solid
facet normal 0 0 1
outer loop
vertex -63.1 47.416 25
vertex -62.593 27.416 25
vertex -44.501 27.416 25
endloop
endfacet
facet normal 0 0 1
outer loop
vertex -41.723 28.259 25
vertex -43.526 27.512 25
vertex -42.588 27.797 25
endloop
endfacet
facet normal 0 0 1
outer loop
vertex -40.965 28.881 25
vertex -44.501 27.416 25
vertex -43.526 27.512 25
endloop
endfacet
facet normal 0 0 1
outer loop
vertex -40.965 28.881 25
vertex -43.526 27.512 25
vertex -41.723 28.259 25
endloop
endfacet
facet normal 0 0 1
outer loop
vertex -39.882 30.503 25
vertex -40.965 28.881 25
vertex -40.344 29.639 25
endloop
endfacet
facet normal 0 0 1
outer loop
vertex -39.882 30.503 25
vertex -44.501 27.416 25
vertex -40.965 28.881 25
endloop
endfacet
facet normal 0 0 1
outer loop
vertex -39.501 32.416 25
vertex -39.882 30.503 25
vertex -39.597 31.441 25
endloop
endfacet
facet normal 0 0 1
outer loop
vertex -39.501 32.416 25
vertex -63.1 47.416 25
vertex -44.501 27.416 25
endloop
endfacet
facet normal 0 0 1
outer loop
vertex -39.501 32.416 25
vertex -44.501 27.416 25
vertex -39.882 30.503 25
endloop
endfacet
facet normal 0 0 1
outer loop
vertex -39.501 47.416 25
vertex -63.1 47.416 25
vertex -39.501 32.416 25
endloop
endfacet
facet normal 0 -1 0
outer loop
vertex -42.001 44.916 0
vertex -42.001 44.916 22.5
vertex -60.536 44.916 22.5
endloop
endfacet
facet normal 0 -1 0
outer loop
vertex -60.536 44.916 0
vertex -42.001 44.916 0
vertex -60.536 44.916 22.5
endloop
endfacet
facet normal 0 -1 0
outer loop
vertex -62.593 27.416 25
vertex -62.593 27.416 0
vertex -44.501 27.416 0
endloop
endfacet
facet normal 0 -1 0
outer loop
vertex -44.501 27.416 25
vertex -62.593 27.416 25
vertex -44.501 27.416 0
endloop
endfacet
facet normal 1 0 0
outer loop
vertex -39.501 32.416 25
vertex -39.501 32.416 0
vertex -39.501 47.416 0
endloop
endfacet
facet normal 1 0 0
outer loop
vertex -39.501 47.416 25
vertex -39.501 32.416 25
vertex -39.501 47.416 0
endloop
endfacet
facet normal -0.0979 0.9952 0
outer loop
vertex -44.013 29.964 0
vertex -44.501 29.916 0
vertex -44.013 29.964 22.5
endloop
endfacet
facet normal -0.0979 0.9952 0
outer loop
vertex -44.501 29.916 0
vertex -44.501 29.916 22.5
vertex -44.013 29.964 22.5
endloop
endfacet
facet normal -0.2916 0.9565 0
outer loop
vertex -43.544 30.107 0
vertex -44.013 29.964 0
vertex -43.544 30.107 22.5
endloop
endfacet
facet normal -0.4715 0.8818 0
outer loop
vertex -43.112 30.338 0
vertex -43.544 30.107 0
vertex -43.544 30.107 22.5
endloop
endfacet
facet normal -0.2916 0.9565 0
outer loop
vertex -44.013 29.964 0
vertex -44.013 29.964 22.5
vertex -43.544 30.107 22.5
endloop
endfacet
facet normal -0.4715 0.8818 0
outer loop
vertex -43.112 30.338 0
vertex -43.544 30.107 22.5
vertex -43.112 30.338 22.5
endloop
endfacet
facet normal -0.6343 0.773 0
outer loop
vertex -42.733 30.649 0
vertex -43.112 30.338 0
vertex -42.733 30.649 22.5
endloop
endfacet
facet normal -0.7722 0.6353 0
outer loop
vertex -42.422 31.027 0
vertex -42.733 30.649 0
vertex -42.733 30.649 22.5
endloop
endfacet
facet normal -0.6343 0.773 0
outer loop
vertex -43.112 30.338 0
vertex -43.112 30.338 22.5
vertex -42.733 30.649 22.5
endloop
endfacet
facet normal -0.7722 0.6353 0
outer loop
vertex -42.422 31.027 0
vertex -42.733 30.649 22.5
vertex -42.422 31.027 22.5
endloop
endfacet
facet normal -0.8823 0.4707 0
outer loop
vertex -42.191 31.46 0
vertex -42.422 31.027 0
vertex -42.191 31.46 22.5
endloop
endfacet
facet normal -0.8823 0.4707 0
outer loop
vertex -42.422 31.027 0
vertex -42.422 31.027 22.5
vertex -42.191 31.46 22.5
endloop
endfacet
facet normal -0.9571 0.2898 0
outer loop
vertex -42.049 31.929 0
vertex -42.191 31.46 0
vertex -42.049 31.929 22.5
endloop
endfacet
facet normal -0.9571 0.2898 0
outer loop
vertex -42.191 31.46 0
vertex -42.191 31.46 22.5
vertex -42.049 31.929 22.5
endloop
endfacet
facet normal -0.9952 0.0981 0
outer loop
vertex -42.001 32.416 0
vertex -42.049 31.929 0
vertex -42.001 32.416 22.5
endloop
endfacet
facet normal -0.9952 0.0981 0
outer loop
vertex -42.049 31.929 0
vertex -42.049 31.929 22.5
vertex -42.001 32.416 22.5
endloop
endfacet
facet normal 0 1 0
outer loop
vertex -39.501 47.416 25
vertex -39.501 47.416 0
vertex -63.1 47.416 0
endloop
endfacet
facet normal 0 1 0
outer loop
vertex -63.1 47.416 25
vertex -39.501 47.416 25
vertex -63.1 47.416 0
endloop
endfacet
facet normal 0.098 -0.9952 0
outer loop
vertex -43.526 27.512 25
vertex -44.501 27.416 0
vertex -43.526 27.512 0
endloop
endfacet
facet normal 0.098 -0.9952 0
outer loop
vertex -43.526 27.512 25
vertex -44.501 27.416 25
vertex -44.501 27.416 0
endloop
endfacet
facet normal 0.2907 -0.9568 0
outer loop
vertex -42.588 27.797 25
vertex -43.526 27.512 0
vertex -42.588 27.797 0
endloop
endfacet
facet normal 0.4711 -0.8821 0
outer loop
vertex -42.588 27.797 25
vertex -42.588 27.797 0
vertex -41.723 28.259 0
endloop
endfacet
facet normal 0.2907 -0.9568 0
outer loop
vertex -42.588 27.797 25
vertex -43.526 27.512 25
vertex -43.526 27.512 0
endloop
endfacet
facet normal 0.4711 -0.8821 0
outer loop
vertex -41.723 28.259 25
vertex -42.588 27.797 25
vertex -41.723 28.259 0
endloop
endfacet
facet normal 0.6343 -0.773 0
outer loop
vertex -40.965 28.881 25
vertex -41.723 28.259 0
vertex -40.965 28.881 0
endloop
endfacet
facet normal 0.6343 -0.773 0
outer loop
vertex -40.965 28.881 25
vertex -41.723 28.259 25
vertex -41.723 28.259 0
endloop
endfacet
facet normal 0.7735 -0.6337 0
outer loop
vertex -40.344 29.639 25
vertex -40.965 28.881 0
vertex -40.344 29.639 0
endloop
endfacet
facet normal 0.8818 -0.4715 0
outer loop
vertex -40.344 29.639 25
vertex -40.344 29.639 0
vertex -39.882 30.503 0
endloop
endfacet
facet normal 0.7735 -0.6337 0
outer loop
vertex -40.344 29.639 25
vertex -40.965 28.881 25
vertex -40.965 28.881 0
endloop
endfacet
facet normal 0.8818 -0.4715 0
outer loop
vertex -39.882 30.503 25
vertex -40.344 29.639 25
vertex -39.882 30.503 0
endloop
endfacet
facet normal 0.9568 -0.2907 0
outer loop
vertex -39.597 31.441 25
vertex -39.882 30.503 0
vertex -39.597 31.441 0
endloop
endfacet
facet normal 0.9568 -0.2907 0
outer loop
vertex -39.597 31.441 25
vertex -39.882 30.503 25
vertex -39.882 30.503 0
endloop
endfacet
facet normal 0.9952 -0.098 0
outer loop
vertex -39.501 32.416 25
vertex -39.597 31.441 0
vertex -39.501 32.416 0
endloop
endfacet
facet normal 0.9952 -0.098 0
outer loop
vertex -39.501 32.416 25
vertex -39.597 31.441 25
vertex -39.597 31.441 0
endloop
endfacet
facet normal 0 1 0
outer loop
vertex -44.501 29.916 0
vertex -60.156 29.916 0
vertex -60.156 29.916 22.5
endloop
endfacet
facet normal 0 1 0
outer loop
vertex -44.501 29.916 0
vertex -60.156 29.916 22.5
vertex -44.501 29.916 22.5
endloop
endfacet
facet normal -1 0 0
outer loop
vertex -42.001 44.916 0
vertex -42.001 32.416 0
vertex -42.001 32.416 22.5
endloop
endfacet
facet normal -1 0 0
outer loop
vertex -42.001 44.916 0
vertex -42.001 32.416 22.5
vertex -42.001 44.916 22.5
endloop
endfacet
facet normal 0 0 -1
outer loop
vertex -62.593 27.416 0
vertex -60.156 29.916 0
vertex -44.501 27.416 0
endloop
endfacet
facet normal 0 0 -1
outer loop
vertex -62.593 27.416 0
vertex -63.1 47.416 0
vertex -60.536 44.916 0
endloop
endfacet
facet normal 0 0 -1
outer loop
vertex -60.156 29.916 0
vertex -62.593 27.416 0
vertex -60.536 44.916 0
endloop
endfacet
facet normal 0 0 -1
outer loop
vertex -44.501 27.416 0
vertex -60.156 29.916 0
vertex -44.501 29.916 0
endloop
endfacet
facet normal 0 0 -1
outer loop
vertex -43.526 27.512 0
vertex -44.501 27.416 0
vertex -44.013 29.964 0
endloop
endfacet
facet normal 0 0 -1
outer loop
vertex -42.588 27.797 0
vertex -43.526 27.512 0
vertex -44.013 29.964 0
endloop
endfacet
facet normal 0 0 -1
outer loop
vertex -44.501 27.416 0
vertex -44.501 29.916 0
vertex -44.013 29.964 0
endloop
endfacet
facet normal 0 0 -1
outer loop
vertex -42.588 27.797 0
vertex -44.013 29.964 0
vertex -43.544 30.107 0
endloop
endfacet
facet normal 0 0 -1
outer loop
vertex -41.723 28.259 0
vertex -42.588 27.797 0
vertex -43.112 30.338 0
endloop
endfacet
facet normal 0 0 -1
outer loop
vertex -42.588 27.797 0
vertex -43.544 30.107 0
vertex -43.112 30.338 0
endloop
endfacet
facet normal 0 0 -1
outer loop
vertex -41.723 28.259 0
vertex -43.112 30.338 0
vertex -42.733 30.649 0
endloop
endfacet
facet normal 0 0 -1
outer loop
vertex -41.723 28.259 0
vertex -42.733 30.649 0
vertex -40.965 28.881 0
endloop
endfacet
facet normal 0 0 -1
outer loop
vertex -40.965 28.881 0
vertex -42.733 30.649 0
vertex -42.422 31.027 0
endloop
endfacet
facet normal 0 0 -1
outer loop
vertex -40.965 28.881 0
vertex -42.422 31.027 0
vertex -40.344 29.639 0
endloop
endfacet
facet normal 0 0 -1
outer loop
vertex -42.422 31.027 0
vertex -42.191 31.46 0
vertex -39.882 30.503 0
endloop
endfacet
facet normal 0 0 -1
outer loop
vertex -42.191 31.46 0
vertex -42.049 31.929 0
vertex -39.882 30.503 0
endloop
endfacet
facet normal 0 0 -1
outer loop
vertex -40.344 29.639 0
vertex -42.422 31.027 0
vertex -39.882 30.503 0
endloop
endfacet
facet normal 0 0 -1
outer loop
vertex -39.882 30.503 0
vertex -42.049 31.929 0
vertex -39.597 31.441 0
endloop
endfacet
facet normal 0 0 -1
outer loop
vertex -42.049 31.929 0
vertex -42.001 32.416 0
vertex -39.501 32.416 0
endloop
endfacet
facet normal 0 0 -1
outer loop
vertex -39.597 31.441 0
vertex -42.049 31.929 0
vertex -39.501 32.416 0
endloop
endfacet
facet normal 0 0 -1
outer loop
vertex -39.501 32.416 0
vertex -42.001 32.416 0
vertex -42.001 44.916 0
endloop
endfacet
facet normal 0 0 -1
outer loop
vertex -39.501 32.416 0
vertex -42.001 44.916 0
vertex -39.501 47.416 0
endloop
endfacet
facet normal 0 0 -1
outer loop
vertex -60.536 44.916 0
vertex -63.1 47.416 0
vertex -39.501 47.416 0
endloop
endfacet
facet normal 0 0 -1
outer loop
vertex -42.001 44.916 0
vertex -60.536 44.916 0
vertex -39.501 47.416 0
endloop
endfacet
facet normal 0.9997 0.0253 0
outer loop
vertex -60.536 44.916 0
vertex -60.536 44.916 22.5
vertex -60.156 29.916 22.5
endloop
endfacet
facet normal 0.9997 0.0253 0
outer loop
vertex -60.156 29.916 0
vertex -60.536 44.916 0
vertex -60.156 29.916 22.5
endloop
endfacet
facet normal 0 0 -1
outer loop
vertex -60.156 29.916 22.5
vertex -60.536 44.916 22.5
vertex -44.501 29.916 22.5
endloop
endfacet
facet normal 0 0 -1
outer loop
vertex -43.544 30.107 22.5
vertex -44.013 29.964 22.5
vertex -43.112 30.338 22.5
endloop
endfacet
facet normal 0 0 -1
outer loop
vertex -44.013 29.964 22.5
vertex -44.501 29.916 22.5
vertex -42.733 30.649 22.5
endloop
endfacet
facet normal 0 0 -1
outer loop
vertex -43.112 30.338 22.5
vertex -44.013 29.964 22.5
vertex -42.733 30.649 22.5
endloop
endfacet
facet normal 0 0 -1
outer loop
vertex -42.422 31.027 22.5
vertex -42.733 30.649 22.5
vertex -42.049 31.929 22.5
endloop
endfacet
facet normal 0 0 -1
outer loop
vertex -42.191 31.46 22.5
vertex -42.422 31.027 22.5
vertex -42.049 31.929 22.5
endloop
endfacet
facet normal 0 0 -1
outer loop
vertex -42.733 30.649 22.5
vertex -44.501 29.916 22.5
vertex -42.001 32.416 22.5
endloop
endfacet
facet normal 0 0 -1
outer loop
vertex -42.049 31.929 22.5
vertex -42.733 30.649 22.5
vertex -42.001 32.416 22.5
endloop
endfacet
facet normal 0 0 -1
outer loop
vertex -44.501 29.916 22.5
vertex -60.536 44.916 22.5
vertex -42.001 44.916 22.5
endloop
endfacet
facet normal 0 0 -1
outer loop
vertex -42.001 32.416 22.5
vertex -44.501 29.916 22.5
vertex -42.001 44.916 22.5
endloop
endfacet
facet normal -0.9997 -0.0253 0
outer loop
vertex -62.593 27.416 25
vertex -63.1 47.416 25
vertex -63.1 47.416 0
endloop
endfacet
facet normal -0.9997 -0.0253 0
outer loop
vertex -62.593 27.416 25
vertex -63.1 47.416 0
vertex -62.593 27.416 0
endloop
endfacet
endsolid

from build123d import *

# Parameters (mm, degrees)
F1_DEPTH = 25
F2_R     = 5
F3_T     = -2.5


with BuildPart() as f1:
    # F0 (on Top) → F1 (new body)
    with BuildSketch(Plane.XY):
        Polygon((-39.500976, 47.416381), (-63.099665, 47.416381), (-62.593336, 27.416381), (-39.500976, 27.416381), align=None)
    extrude(amount=F1_DEPTH)

    # F2
    f2_edges = [f1.edges().sort_by_distance(p)[0] for p in [
        (-39.500976, 27.416381, 12.5),
    ]]
    fillet(f2_edges, radius=F2_R)

    # F3
    f3_openings = [f1.faces().sort_by_distance(p)[0] for p in [
        (-51.296904, 37.556207, 0),
    ]]
    offset(amount=F3_T, openings=f3_openings)


solid = f1.part
